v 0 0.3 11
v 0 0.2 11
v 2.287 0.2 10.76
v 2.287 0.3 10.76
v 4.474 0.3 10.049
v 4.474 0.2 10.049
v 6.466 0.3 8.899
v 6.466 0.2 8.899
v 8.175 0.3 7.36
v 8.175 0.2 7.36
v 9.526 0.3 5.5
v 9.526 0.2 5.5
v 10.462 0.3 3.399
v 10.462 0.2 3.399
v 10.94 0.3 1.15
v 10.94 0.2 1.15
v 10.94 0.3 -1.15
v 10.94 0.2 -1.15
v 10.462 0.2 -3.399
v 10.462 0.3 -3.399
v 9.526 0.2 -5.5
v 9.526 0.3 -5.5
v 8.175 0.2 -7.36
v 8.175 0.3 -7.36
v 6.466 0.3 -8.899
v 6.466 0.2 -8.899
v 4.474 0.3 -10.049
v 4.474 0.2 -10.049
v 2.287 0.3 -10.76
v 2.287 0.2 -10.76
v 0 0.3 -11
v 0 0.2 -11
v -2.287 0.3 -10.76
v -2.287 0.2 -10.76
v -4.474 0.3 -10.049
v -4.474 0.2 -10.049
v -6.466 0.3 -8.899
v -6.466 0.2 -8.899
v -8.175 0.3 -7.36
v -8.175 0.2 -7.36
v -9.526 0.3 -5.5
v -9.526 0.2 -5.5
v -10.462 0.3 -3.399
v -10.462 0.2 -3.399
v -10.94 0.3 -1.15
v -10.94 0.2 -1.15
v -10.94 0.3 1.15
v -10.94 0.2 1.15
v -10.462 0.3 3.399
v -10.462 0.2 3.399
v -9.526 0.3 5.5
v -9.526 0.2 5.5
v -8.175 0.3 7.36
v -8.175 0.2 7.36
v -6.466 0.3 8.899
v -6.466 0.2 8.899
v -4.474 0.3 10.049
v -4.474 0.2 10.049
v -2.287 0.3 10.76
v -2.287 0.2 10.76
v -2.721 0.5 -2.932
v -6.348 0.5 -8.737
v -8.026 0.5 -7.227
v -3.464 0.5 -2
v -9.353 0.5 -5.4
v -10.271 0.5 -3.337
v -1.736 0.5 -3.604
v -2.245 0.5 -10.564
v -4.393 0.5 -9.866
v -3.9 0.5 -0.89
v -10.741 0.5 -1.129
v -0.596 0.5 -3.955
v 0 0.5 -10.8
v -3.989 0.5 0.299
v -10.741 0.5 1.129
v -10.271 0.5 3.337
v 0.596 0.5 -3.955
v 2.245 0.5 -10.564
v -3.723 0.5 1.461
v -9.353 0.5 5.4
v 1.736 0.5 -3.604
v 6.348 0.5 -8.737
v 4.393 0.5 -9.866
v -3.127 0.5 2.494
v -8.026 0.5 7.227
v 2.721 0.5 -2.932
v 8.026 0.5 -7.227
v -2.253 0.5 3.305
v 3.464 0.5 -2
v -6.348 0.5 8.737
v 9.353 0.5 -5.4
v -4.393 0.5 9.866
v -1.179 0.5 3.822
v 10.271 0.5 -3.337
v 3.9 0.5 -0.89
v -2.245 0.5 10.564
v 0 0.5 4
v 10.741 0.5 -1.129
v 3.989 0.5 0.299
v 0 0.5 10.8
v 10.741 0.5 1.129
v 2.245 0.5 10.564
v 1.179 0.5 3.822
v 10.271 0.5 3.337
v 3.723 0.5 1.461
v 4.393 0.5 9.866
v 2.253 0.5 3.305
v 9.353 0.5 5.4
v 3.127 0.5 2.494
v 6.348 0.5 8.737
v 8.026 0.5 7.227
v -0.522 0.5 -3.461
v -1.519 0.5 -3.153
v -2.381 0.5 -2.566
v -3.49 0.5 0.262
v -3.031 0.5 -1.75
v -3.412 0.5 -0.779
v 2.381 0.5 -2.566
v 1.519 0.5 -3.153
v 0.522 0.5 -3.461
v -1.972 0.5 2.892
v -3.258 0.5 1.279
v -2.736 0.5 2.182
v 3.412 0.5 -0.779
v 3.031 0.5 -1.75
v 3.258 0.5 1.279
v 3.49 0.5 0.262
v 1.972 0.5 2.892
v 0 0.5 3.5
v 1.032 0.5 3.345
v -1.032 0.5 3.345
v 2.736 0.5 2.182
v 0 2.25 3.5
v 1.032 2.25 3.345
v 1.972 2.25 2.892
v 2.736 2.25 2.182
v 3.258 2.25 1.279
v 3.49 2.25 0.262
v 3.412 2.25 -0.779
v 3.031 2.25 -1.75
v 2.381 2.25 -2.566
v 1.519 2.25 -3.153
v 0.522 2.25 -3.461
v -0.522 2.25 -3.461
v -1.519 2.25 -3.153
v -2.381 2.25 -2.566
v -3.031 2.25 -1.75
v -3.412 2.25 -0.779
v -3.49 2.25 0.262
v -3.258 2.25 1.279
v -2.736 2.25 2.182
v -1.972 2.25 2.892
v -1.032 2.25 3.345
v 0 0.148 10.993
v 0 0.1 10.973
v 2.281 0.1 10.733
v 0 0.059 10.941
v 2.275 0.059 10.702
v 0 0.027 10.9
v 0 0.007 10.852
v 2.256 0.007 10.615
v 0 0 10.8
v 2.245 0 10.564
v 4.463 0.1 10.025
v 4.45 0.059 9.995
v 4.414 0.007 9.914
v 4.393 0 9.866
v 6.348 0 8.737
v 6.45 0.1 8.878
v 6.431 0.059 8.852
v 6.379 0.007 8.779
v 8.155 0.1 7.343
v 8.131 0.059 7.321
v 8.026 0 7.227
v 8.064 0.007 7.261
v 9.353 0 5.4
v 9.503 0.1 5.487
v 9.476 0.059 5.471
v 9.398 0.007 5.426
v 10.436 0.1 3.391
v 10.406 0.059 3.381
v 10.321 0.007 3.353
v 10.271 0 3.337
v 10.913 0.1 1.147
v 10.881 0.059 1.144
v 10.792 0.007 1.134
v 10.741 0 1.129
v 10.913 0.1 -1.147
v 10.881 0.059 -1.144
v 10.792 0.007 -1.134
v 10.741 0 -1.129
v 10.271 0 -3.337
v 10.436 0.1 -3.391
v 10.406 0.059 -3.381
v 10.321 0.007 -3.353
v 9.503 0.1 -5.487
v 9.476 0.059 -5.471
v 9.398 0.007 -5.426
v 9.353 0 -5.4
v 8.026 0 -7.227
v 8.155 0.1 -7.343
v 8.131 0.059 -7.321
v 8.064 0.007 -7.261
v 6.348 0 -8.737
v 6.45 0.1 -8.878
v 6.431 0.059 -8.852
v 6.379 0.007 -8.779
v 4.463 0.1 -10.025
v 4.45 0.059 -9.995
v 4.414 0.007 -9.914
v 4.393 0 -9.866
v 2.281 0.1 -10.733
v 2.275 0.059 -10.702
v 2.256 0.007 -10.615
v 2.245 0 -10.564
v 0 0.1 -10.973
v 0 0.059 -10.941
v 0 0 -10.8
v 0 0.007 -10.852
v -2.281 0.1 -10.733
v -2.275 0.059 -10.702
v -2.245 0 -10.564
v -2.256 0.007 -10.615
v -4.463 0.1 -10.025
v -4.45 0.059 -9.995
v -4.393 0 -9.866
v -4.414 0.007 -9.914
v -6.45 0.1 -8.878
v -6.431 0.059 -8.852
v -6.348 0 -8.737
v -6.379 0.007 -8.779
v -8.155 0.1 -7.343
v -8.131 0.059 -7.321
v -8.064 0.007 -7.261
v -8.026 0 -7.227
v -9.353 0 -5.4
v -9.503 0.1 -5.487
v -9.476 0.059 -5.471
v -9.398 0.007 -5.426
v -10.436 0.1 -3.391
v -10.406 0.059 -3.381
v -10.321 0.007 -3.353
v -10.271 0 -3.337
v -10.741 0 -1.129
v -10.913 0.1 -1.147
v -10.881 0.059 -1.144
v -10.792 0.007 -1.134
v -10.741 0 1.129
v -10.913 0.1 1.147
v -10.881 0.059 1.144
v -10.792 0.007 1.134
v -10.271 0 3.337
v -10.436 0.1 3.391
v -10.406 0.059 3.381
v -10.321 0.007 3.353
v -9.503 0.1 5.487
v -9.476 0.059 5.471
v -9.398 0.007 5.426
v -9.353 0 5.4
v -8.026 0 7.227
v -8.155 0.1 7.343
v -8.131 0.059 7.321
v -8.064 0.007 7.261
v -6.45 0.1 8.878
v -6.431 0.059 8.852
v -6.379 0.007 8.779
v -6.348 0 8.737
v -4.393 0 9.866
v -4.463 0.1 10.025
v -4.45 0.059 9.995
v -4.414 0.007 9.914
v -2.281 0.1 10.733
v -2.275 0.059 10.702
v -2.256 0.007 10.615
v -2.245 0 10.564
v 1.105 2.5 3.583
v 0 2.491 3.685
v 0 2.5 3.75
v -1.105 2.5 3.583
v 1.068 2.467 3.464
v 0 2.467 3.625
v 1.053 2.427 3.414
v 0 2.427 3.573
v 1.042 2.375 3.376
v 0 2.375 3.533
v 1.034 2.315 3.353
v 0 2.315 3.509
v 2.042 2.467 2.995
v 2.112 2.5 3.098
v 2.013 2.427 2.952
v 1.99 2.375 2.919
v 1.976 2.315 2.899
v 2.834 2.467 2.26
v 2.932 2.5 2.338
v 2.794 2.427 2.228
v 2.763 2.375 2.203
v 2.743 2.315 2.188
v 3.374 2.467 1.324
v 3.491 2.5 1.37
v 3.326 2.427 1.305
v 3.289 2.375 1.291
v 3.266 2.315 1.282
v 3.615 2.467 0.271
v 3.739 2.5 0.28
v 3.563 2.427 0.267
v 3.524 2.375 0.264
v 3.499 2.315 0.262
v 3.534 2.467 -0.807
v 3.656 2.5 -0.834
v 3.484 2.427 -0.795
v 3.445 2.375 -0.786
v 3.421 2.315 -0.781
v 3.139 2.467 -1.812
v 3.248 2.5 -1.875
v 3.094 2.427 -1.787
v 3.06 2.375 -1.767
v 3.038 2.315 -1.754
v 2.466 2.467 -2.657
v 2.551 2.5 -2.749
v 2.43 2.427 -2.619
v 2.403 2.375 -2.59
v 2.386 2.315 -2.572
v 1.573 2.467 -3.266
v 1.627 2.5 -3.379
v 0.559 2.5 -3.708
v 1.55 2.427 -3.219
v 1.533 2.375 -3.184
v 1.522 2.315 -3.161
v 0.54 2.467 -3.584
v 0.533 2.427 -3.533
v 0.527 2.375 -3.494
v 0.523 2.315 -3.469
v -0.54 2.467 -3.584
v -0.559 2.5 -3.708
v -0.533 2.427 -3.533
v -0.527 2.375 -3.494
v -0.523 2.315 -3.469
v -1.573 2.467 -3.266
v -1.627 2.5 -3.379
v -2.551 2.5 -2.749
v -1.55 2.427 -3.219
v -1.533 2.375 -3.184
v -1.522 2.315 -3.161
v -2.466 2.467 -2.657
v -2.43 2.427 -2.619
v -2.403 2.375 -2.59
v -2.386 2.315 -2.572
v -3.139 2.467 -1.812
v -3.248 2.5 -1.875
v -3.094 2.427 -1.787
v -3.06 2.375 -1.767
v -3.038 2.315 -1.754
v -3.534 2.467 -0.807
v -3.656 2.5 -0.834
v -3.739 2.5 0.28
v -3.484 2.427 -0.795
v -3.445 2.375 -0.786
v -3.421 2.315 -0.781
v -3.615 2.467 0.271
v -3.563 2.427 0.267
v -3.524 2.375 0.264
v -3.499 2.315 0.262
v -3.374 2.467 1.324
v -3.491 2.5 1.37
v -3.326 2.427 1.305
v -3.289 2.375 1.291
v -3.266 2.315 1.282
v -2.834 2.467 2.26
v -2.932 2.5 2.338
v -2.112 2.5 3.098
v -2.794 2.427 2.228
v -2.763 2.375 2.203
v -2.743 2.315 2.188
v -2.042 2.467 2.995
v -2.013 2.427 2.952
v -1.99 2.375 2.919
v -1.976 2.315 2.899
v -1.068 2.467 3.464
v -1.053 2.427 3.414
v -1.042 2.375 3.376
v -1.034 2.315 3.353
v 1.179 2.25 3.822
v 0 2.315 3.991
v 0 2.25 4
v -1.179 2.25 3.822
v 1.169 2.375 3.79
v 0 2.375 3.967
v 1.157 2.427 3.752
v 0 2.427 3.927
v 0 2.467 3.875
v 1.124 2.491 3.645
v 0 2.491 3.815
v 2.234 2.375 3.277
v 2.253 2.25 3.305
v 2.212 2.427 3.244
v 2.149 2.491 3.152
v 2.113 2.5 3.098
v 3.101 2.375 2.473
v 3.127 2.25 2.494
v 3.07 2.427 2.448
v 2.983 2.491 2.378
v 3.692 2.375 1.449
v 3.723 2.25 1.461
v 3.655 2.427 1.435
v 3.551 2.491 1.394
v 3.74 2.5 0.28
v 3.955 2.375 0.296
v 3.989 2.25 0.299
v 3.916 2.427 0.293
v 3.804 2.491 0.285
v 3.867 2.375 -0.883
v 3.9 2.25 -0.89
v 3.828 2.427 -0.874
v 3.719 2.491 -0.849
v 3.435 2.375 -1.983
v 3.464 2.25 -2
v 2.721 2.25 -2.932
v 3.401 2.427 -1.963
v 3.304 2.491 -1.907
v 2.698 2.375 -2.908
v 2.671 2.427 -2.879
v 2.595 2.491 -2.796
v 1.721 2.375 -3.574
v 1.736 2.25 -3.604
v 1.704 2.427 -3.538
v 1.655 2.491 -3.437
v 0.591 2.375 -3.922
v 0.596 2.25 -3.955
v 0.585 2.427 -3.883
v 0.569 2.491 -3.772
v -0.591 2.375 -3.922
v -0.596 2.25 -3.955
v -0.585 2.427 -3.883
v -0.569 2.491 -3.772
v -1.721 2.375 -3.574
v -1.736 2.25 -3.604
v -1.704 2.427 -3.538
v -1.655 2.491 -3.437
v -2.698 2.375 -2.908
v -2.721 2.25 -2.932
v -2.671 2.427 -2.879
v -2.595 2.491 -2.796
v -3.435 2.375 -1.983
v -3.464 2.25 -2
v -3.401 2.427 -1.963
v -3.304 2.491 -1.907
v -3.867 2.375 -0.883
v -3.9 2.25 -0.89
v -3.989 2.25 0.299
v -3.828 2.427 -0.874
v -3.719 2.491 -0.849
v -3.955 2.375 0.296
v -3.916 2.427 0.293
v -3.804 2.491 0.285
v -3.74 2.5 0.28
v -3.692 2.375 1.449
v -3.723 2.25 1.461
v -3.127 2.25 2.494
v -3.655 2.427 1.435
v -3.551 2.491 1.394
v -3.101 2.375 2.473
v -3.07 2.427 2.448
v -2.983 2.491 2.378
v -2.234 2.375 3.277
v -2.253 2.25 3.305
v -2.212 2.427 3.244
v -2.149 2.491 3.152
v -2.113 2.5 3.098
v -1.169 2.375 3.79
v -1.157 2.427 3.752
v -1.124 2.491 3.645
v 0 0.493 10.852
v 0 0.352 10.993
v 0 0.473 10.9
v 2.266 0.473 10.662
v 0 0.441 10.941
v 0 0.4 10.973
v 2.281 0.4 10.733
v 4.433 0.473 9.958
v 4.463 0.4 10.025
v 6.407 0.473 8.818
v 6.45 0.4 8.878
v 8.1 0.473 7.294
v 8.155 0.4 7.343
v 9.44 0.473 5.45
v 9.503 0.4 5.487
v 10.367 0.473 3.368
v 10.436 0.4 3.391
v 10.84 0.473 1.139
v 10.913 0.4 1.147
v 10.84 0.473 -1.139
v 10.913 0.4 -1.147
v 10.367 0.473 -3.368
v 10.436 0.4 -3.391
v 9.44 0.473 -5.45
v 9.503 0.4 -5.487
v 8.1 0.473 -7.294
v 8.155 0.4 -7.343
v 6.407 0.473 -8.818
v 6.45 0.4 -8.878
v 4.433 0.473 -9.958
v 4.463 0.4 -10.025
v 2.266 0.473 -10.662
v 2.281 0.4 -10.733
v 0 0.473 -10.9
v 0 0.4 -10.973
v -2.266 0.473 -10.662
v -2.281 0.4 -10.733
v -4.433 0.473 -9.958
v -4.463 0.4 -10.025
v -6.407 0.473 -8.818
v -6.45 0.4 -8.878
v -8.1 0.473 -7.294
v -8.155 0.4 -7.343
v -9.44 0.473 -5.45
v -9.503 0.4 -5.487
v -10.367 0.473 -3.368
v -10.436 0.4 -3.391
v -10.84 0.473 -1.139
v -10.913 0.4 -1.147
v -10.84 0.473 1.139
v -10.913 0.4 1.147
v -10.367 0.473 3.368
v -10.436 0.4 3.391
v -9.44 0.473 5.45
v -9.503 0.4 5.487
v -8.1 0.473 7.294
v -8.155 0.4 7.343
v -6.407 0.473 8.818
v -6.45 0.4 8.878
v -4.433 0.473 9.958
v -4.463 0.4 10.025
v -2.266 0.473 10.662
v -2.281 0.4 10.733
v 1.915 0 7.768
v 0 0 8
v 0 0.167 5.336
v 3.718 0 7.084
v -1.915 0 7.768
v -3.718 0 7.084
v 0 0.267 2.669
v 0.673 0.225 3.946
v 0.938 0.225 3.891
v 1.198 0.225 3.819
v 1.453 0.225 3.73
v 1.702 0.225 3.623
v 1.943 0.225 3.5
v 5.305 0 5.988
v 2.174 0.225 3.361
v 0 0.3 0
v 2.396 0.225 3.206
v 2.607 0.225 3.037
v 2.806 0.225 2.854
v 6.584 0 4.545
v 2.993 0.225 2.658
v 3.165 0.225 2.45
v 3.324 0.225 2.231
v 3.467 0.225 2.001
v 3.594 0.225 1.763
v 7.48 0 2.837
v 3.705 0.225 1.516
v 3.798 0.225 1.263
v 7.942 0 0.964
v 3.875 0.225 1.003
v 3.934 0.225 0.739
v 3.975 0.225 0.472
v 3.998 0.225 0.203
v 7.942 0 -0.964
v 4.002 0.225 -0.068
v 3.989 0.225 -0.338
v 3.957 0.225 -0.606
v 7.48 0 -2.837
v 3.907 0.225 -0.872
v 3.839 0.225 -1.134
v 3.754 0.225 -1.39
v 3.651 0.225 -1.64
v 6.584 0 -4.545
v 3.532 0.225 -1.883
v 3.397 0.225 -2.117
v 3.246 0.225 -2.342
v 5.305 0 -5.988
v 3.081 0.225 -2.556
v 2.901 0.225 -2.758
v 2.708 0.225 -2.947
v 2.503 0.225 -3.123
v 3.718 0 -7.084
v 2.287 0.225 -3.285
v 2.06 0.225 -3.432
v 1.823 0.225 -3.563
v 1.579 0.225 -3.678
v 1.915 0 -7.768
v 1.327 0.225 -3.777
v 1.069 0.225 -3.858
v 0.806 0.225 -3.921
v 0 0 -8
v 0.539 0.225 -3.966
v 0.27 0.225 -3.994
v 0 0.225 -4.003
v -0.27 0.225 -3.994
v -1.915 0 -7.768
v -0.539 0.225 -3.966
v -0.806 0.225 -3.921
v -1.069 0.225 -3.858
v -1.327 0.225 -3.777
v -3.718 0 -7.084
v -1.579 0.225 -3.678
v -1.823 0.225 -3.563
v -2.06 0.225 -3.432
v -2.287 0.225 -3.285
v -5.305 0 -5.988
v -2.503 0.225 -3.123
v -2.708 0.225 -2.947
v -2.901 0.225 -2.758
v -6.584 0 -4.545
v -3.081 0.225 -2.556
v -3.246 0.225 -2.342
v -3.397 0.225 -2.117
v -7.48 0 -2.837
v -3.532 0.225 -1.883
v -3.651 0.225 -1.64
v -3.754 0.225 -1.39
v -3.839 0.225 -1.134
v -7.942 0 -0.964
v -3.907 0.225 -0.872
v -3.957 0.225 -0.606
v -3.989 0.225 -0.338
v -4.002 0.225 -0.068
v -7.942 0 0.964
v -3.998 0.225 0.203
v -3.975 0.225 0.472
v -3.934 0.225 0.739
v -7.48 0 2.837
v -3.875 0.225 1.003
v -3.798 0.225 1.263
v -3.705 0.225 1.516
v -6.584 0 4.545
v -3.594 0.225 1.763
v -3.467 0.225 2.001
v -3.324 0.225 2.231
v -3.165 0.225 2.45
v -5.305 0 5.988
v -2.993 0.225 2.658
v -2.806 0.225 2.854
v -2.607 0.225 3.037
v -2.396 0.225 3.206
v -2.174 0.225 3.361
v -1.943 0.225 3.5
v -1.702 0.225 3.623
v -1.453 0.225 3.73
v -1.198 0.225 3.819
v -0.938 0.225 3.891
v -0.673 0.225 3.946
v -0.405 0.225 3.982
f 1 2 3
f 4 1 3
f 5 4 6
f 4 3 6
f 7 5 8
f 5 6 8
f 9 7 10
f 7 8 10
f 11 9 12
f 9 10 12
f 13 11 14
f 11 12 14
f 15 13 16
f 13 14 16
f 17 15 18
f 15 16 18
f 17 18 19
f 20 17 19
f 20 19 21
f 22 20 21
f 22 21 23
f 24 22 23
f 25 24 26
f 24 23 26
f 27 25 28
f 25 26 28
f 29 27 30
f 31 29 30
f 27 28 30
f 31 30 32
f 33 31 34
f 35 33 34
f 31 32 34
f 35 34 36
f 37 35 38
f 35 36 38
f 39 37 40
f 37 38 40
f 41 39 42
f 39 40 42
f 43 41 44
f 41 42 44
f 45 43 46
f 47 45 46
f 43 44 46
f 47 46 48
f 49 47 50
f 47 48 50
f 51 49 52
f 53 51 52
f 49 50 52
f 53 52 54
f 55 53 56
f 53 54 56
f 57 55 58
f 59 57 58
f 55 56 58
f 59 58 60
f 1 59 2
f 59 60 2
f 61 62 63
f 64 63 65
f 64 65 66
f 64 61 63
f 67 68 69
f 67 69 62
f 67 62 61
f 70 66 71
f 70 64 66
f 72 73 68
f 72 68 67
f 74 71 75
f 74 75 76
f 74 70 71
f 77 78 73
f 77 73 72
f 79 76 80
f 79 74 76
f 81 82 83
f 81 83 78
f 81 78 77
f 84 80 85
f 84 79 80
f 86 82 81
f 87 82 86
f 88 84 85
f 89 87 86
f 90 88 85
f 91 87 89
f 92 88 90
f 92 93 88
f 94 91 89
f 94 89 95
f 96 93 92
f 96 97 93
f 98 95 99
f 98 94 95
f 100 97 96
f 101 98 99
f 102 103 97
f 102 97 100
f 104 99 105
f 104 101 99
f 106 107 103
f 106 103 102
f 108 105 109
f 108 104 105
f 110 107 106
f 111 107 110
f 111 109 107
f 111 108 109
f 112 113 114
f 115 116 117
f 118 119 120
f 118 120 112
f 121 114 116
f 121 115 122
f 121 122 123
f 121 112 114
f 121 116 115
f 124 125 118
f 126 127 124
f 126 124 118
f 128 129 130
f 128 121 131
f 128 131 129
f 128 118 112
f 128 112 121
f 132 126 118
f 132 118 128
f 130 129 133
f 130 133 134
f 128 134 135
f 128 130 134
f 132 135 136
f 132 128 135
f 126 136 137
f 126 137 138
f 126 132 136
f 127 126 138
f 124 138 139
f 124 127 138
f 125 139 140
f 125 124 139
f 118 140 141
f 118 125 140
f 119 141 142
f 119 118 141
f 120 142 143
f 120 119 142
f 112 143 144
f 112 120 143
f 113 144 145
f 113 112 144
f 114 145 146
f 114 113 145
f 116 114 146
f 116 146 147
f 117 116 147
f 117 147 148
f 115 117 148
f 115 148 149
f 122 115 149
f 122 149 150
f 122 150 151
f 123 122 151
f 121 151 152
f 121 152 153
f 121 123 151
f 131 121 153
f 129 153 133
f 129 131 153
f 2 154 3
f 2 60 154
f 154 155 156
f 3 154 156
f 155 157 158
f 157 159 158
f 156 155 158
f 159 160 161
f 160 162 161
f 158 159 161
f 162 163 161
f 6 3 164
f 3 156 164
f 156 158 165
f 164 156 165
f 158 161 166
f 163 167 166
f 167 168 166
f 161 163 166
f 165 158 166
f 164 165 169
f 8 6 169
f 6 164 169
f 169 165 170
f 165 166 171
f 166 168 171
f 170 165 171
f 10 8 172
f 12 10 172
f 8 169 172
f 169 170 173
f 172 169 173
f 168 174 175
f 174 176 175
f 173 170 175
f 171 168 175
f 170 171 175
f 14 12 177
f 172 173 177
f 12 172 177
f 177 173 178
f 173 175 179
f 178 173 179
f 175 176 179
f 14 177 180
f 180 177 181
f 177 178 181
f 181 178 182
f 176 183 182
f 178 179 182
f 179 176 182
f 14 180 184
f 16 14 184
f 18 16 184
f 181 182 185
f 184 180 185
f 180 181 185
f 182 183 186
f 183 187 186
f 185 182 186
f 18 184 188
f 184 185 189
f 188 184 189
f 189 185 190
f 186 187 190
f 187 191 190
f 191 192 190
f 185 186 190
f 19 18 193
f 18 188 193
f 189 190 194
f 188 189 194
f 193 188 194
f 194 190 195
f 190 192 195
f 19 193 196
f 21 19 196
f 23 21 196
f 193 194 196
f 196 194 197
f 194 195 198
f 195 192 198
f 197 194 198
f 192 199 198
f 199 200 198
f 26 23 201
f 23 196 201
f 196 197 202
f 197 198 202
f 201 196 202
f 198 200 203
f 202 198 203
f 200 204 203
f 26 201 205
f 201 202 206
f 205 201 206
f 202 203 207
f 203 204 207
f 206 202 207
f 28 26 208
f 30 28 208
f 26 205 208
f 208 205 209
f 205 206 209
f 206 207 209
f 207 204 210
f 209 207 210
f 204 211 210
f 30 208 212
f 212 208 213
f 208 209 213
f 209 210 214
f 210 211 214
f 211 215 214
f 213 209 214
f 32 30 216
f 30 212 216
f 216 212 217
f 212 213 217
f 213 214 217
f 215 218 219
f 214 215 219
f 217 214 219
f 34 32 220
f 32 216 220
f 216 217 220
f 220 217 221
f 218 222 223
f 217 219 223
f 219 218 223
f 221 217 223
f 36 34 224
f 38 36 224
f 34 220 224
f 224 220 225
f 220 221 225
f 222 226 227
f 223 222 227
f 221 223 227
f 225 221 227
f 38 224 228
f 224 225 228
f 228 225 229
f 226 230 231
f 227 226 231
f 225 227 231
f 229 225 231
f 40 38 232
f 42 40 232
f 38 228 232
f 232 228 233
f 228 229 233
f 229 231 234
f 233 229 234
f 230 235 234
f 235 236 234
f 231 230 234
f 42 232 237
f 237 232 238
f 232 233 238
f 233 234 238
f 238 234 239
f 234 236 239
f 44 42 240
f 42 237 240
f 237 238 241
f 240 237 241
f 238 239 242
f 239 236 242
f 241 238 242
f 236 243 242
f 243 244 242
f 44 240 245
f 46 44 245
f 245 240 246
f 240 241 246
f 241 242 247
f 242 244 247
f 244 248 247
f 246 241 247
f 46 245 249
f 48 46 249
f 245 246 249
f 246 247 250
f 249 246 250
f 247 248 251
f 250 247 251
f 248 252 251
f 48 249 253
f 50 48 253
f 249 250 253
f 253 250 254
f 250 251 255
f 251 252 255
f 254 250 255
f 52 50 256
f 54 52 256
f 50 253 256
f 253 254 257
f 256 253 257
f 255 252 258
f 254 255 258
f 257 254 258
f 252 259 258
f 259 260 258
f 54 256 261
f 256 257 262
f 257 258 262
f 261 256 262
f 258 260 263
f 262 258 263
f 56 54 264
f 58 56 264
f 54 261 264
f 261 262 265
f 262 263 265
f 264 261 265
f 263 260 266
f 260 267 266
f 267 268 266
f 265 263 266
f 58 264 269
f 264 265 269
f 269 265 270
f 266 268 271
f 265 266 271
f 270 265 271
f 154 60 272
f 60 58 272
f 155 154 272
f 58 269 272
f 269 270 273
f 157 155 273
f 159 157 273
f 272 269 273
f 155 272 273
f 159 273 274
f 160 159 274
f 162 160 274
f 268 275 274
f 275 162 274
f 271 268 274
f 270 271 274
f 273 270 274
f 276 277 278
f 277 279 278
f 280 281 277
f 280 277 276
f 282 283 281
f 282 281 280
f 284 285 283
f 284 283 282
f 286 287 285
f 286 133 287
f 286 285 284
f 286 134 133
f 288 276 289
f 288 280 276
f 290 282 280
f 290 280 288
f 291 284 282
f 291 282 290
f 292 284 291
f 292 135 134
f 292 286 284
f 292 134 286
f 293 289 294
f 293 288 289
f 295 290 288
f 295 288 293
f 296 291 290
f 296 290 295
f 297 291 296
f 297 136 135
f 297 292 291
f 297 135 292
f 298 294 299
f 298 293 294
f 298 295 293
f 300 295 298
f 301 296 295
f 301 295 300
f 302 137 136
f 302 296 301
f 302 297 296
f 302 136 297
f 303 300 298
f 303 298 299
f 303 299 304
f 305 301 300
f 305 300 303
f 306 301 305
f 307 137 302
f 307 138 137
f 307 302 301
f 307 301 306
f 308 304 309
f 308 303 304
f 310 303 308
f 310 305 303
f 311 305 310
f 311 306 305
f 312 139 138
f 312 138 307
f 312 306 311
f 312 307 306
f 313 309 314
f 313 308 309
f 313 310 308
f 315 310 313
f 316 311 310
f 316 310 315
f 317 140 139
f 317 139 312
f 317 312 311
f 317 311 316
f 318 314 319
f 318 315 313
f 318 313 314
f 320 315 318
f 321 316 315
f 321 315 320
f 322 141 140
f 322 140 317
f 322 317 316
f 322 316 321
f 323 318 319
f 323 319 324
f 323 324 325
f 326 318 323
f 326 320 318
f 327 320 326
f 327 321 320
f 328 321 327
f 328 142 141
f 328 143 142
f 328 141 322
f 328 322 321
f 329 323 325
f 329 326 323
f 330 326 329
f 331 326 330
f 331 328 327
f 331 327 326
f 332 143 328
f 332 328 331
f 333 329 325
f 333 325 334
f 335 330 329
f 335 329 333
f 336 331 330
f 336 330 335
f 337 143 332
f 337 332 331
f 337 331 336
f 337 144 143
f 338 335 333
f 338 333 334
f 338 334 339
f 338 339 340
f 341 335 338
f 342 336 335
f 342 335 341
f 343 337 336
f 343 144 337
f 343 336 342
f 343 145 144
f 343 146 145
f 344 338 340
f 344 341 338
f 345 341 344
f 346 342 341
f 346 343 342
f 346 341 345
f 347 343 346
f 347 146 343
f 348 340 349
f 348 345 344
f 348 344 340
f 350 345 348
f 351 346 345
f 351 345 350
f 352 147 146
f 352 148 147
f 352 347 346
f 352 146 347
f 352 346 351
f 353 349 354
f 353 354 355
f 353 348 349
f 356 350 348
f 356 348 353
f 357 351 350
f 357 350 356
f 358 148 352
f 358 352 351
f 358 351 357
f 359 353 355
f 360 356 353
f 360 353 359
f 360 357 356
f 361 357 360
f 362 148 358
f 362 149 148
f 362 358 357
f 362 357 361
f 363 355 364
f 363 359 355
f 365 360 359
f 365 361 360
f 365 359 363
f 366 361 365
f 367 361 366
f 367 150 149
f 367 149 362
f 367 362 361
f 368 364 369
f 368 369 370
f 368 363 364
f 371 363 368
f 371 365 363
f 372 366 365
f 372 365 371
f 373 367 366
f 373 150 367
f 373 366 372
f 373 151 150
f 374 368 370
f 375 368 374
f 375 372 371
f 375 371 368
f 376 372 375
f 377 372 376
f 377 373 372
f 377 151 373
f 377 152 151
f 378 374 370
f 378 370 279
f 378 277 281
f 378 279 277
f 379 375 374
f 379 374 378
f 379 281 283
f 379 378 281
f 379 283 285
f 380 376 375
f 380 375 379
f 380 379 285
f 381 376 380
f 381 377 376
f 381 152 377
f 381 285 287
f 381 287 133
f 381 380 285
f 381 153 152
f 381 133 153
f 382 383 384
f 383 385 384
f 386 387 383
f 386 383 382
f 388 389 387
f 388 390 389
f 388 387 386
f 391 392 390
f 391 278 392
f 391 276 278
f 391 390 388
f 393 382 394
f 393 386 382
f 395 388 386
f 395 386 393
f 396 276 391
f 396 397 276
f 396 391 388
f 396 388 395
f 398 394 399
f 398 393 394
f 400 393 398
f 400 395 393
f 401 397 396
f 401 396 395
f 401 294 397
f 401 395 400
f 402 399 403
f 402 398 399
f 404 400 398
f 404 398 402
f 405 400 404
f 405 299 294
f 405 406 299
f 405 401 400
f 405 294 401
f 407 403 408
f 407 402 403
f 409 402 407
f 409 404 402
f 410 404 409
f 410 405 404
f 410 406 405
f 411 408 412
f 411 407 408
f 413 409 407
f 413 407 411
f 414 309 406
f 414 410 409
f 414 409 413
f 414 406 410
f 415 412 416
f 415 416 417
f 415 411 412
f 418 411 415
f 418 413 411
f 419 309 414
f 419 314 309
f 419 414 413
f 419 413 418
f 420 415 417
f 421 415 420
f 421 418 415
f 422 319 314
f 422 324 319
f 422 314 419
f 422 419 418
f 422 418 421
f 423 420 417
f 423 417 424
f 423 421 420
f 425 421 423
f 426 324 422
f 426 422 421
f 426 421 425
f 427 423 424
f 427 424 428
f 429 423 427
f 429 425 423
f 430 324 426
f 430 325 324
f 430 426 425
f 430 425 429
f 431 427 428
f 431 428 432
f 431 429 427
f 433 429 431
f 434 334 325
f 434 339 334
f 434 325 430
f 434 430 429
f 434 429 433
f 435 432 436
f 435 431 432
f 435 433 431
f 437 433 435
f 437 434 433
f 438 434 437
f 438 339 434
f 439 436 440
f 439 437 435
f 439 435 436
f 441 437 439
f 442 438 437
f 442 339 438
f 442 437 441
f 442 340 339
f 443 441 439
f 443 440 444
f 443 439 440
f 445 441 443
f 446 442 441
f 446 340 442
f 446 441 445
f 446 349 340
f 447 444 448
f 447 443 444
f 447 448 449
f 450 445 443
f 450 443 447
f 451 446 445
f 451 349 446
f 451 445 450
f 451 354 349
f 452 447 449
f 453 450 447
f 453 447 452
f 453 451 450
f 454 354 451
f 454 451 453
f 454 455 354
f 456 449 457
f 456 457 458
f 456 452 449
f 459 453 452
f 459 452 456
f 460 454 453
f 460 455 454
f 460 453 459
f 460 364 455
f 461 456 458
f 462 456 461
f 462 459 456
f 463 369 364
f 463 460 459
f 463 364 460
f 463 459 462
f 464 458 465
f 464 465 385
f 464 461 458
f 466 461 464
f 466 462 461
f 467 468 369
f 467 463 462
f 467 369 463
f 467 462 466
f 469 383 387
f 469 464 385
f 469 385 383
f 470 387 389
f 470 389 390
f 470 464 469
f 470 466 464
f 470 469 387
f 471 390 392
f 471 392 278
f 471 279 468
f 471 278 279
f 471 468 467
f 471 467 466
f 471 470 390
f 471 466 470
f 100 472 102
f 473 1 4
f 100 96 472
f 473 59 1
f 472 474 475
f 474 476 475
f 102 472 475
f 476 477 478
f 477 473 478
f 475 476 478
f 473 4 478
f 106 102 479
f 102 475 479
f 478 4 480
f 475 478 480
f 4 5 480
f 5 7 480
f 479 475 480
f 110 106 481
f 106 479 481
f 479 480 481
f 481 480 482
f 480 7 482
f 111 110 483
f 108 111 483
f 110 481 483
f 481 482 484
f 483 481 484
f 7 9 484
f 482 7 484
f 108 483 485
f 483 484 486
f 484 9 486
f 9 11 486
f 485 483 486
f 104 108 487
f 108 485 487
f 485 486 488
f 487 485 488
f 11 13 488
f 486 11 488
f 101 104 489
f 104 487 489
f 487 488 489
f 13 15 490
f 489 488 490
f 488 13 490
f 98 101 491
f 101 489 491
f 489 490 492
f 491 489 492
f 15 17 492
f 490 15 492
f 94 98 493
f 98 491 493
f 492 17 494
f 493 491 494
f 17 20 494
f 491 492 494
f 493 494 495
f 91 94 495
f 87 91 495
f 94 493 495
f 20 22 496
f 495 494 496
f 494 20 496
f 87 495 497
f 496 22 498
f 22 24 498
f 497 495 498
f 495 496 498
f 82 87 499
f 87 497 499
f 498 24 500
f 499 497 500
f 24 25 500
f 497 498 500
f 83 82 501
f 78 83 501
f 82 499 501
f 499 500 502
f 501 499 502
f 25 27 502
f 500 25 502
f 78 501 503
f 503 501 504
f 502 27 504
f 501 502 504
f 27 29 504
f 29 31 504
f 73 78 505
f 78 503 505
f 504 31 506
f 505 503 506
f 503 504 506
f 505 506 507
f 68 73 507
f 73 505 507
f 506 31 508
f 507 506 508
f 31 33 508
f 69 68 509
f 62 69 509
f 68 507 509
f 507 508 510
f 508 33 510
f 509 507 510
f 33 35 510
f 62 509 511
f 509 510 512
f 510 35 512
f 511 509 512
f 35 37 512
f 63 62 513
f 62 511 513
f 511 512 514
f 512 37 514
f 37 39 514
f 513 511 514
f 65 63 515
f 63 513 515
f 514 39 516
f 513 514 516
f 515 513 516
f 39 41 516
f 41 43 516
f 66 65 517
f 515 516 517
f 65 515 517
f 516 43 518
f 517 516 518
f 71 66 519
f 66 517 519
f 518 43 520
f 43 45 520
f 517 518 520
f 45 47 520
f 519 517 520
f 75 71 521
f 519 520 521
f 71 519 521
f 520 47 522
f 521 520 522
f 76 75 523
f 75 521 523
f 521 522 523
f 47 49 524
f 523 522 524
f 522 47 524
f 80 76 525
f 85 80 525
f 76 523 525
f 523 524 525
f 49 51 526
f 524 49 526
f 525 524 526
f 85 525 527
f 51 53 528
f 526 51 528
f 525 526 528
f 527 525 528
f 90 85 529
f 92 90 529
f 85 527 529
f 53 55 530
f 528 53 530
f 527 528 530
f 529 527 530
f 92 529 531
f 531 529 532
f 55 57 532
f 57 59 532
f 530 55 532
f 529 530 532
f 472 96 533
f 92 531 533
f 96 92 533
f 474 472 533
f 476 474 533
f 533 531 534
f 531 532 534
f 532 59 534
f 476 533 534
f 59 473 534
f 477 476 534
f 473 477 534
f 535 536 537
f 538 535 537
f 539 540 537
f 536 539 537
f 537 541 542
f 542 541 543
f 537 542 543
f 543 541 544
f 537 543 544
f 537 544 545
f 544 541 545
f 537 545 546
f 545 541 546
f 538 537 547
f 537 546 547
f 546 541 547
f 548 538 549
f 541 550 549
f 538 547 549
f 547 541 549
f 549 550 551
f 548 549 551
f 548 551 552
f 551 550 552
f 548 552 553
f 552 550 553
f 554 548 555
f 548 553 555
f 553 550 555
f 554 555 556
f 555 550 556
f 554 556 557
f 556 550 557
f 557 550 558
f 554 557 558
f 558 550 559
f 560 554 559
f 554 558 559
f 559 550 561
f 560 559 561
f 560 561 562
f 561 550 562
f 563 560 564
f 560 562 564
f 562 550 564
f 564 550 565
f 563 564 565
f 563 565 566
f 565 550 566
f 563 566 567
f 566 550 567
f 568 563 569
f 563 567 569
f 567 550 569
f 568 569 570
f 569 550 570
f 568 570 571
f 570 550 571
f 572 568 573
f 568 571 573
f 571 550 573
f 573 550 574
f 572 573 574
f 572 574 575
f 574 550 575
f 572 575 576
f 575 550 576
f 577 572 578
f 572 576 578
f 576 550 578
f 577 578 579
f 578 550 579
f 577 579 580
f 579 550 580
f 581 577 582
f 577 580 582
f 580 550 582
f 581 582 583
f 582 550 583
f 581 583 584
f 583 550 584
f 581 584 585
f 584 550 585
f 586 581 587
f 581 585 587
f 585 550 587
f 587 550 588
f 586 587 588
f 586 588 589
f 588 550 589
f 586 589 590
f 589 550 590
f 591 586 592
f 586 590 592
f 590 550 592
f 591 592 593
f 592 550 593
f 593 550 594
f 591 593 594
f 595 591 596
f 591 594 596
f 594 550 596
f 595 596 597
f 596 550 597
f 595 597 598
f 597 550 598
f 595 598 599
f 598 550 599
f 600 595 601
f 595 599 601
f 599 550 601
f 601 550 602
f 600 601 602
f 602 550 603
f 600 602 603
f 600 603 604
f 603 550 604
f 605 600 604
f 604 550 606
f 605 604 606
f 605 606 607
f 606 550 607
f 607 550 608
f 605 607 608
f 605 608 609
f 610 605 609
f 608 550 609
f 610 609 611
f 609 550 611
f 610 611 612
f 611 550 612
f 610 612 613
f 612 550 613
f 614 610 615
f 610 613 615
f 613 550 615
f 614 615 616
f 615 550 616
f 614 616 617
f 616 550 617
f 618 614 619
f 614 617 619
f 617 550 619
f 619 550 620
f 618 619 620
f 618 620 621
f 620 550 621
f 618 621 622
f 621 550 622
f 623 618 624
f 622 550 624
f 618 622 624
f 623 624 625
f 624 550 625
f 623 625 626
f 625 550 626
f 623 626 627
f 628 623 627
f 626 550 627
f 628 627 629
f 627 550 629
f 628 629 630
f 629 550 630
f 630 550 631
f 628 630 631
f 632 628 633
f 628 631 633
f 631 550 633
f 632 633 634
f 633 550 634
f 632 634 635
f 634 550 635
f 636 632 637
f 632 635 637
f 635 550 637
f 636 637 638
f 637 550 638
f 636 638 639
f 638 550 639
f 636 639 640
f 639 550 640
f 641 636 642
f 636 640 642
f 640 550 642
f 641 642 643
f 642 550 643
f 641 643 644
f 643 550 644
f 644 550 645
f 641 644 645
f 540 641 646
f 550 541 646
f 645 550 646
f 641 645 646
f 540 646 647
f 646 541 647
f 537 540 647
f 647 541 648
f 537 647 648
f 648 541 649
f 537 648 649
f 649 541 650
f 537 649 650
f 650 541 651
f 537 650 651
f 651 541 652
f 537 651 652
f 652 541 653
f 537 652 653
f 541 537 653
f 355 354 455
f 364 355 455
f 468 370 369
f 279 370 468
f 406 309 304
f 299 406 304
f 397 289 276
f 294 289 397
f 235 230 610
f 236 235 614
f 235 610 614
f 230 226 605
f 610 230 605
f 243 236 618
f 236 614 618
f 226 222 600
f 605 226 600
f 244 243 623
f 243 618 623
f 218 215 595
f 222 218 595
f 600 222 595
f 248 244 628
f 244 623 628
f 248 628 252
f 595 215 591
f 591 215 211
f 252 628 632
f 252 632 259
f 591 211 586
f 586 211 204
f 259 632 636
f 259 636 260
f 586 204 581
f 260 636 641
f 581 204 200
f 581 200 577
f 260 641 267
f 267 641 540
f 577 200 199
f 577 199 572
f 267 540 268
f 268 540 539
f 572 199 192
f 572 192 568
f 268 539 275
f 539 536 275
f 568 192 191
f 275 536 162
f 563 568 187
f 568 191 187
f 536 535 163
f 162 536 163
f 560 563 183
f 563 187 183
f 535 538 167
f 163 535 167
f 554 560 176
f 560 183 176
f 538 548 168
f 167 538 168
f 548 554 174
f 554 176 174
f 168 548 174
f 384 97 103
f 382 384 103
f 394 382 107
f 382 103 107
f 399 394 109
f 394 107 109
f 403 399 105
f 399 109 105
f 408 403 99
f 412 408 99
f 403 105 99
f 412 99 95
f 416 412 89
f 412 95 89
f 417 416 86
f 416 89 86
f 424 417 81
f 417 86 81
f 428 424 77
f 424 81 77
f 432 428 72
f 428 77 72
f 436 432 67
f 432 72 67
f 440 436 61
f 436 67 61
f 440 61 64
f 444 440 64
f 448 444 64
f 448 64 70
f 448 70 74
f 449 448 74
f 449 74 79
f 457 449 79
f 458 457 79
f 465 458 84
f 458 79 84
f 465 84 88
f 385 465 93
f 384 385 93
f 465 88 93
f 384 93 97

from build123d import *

# Parameters (mm, degrees)
SKETCH_1_R      = 11
EXTRUDE_1_DEPTH = 0.5
SKETCH_2_R      = 4
SKETCH_2_R_2    = 3.5
EXTRUDE_2_DEPTH = 2
FILLET_1_R      = 0.25
FILLET_2_R      = 0.2


with BuildPart() as part:
    # 草图1 → 凸台-拉伸1 (new body)
    with BuildSketch(Plane(origin=(0, 0, 0), x_dir=(1, 0, 0), z_dir=(0, 1, 0))):
        with Locations(Location((0, 0, 0), (0, 0, 270))):
            Circle(SKETCH_1_R)
    extrude(amount=EXTRUDE_1_DEPTH)

    # 草图2 → 凸台-拉伸2 (add)
    with BuildSketch(Plane(origin=(0, 0.5, 0), x_dir=(1, 0, 0), z_dir=(0, 1, 0))):
        with Locations(Location((0, 0, 0), (0, 0, 270))):
            Circle(SKETCH_2_R)
        with Locations(Location((0, 0, 0), (0, 0, 270))):
            Circle(SKETCH_2_R_2, mode=Mode.SUBTRACT)
    extrude(amount=EXTRUDE_2_DEPTH)

    # 圆角1
    fillet_1_edges = [part.edges().sort_by_distance(p)[0] for p in [
        (0, 2.5, -4),
        (0, 2.5, -3.5),
    ]]
    fillet(fillet_1_edges, radius=FILLET_1_R - 0.0001)  # a hair under: the kernel refuses the full size

    # 草图3 → 切除-旋转2 (revolve, cut)
    with BuildSketch(Plane(origin=(0, 0, 0), x_dir=(0, 0, -1), z_dir=(1, 0, 0)), mode=Mode.PRIVATE) as cut_revolve_2_sk:
        with BuildLine():
            Line((0, 0), (8, 0))
            ThreePointArc((8, 0), (4.002811512, 0.224973651), (0, 0.3))
            Line((0, 0.3), (0, 0))
        make_face()
    revolve(cut_revolve_2_sk.sketch.rotate(Axis((0, 0, 0), (0, 1, 0)), 180), axis=Axis((0, 0, 0), (0, 1, 0)), mode=Mode.SUBTRACT)

    # 圆角2
    fillet_2_edges = [part.edges().sort_by_distance(p)[0] for p in [
        (0, 0, -11),
        (0, 0.5, -11),
    ]]
    fillet(fillet_2_edges, radius=FILLET_2_R)


solid = part.part
